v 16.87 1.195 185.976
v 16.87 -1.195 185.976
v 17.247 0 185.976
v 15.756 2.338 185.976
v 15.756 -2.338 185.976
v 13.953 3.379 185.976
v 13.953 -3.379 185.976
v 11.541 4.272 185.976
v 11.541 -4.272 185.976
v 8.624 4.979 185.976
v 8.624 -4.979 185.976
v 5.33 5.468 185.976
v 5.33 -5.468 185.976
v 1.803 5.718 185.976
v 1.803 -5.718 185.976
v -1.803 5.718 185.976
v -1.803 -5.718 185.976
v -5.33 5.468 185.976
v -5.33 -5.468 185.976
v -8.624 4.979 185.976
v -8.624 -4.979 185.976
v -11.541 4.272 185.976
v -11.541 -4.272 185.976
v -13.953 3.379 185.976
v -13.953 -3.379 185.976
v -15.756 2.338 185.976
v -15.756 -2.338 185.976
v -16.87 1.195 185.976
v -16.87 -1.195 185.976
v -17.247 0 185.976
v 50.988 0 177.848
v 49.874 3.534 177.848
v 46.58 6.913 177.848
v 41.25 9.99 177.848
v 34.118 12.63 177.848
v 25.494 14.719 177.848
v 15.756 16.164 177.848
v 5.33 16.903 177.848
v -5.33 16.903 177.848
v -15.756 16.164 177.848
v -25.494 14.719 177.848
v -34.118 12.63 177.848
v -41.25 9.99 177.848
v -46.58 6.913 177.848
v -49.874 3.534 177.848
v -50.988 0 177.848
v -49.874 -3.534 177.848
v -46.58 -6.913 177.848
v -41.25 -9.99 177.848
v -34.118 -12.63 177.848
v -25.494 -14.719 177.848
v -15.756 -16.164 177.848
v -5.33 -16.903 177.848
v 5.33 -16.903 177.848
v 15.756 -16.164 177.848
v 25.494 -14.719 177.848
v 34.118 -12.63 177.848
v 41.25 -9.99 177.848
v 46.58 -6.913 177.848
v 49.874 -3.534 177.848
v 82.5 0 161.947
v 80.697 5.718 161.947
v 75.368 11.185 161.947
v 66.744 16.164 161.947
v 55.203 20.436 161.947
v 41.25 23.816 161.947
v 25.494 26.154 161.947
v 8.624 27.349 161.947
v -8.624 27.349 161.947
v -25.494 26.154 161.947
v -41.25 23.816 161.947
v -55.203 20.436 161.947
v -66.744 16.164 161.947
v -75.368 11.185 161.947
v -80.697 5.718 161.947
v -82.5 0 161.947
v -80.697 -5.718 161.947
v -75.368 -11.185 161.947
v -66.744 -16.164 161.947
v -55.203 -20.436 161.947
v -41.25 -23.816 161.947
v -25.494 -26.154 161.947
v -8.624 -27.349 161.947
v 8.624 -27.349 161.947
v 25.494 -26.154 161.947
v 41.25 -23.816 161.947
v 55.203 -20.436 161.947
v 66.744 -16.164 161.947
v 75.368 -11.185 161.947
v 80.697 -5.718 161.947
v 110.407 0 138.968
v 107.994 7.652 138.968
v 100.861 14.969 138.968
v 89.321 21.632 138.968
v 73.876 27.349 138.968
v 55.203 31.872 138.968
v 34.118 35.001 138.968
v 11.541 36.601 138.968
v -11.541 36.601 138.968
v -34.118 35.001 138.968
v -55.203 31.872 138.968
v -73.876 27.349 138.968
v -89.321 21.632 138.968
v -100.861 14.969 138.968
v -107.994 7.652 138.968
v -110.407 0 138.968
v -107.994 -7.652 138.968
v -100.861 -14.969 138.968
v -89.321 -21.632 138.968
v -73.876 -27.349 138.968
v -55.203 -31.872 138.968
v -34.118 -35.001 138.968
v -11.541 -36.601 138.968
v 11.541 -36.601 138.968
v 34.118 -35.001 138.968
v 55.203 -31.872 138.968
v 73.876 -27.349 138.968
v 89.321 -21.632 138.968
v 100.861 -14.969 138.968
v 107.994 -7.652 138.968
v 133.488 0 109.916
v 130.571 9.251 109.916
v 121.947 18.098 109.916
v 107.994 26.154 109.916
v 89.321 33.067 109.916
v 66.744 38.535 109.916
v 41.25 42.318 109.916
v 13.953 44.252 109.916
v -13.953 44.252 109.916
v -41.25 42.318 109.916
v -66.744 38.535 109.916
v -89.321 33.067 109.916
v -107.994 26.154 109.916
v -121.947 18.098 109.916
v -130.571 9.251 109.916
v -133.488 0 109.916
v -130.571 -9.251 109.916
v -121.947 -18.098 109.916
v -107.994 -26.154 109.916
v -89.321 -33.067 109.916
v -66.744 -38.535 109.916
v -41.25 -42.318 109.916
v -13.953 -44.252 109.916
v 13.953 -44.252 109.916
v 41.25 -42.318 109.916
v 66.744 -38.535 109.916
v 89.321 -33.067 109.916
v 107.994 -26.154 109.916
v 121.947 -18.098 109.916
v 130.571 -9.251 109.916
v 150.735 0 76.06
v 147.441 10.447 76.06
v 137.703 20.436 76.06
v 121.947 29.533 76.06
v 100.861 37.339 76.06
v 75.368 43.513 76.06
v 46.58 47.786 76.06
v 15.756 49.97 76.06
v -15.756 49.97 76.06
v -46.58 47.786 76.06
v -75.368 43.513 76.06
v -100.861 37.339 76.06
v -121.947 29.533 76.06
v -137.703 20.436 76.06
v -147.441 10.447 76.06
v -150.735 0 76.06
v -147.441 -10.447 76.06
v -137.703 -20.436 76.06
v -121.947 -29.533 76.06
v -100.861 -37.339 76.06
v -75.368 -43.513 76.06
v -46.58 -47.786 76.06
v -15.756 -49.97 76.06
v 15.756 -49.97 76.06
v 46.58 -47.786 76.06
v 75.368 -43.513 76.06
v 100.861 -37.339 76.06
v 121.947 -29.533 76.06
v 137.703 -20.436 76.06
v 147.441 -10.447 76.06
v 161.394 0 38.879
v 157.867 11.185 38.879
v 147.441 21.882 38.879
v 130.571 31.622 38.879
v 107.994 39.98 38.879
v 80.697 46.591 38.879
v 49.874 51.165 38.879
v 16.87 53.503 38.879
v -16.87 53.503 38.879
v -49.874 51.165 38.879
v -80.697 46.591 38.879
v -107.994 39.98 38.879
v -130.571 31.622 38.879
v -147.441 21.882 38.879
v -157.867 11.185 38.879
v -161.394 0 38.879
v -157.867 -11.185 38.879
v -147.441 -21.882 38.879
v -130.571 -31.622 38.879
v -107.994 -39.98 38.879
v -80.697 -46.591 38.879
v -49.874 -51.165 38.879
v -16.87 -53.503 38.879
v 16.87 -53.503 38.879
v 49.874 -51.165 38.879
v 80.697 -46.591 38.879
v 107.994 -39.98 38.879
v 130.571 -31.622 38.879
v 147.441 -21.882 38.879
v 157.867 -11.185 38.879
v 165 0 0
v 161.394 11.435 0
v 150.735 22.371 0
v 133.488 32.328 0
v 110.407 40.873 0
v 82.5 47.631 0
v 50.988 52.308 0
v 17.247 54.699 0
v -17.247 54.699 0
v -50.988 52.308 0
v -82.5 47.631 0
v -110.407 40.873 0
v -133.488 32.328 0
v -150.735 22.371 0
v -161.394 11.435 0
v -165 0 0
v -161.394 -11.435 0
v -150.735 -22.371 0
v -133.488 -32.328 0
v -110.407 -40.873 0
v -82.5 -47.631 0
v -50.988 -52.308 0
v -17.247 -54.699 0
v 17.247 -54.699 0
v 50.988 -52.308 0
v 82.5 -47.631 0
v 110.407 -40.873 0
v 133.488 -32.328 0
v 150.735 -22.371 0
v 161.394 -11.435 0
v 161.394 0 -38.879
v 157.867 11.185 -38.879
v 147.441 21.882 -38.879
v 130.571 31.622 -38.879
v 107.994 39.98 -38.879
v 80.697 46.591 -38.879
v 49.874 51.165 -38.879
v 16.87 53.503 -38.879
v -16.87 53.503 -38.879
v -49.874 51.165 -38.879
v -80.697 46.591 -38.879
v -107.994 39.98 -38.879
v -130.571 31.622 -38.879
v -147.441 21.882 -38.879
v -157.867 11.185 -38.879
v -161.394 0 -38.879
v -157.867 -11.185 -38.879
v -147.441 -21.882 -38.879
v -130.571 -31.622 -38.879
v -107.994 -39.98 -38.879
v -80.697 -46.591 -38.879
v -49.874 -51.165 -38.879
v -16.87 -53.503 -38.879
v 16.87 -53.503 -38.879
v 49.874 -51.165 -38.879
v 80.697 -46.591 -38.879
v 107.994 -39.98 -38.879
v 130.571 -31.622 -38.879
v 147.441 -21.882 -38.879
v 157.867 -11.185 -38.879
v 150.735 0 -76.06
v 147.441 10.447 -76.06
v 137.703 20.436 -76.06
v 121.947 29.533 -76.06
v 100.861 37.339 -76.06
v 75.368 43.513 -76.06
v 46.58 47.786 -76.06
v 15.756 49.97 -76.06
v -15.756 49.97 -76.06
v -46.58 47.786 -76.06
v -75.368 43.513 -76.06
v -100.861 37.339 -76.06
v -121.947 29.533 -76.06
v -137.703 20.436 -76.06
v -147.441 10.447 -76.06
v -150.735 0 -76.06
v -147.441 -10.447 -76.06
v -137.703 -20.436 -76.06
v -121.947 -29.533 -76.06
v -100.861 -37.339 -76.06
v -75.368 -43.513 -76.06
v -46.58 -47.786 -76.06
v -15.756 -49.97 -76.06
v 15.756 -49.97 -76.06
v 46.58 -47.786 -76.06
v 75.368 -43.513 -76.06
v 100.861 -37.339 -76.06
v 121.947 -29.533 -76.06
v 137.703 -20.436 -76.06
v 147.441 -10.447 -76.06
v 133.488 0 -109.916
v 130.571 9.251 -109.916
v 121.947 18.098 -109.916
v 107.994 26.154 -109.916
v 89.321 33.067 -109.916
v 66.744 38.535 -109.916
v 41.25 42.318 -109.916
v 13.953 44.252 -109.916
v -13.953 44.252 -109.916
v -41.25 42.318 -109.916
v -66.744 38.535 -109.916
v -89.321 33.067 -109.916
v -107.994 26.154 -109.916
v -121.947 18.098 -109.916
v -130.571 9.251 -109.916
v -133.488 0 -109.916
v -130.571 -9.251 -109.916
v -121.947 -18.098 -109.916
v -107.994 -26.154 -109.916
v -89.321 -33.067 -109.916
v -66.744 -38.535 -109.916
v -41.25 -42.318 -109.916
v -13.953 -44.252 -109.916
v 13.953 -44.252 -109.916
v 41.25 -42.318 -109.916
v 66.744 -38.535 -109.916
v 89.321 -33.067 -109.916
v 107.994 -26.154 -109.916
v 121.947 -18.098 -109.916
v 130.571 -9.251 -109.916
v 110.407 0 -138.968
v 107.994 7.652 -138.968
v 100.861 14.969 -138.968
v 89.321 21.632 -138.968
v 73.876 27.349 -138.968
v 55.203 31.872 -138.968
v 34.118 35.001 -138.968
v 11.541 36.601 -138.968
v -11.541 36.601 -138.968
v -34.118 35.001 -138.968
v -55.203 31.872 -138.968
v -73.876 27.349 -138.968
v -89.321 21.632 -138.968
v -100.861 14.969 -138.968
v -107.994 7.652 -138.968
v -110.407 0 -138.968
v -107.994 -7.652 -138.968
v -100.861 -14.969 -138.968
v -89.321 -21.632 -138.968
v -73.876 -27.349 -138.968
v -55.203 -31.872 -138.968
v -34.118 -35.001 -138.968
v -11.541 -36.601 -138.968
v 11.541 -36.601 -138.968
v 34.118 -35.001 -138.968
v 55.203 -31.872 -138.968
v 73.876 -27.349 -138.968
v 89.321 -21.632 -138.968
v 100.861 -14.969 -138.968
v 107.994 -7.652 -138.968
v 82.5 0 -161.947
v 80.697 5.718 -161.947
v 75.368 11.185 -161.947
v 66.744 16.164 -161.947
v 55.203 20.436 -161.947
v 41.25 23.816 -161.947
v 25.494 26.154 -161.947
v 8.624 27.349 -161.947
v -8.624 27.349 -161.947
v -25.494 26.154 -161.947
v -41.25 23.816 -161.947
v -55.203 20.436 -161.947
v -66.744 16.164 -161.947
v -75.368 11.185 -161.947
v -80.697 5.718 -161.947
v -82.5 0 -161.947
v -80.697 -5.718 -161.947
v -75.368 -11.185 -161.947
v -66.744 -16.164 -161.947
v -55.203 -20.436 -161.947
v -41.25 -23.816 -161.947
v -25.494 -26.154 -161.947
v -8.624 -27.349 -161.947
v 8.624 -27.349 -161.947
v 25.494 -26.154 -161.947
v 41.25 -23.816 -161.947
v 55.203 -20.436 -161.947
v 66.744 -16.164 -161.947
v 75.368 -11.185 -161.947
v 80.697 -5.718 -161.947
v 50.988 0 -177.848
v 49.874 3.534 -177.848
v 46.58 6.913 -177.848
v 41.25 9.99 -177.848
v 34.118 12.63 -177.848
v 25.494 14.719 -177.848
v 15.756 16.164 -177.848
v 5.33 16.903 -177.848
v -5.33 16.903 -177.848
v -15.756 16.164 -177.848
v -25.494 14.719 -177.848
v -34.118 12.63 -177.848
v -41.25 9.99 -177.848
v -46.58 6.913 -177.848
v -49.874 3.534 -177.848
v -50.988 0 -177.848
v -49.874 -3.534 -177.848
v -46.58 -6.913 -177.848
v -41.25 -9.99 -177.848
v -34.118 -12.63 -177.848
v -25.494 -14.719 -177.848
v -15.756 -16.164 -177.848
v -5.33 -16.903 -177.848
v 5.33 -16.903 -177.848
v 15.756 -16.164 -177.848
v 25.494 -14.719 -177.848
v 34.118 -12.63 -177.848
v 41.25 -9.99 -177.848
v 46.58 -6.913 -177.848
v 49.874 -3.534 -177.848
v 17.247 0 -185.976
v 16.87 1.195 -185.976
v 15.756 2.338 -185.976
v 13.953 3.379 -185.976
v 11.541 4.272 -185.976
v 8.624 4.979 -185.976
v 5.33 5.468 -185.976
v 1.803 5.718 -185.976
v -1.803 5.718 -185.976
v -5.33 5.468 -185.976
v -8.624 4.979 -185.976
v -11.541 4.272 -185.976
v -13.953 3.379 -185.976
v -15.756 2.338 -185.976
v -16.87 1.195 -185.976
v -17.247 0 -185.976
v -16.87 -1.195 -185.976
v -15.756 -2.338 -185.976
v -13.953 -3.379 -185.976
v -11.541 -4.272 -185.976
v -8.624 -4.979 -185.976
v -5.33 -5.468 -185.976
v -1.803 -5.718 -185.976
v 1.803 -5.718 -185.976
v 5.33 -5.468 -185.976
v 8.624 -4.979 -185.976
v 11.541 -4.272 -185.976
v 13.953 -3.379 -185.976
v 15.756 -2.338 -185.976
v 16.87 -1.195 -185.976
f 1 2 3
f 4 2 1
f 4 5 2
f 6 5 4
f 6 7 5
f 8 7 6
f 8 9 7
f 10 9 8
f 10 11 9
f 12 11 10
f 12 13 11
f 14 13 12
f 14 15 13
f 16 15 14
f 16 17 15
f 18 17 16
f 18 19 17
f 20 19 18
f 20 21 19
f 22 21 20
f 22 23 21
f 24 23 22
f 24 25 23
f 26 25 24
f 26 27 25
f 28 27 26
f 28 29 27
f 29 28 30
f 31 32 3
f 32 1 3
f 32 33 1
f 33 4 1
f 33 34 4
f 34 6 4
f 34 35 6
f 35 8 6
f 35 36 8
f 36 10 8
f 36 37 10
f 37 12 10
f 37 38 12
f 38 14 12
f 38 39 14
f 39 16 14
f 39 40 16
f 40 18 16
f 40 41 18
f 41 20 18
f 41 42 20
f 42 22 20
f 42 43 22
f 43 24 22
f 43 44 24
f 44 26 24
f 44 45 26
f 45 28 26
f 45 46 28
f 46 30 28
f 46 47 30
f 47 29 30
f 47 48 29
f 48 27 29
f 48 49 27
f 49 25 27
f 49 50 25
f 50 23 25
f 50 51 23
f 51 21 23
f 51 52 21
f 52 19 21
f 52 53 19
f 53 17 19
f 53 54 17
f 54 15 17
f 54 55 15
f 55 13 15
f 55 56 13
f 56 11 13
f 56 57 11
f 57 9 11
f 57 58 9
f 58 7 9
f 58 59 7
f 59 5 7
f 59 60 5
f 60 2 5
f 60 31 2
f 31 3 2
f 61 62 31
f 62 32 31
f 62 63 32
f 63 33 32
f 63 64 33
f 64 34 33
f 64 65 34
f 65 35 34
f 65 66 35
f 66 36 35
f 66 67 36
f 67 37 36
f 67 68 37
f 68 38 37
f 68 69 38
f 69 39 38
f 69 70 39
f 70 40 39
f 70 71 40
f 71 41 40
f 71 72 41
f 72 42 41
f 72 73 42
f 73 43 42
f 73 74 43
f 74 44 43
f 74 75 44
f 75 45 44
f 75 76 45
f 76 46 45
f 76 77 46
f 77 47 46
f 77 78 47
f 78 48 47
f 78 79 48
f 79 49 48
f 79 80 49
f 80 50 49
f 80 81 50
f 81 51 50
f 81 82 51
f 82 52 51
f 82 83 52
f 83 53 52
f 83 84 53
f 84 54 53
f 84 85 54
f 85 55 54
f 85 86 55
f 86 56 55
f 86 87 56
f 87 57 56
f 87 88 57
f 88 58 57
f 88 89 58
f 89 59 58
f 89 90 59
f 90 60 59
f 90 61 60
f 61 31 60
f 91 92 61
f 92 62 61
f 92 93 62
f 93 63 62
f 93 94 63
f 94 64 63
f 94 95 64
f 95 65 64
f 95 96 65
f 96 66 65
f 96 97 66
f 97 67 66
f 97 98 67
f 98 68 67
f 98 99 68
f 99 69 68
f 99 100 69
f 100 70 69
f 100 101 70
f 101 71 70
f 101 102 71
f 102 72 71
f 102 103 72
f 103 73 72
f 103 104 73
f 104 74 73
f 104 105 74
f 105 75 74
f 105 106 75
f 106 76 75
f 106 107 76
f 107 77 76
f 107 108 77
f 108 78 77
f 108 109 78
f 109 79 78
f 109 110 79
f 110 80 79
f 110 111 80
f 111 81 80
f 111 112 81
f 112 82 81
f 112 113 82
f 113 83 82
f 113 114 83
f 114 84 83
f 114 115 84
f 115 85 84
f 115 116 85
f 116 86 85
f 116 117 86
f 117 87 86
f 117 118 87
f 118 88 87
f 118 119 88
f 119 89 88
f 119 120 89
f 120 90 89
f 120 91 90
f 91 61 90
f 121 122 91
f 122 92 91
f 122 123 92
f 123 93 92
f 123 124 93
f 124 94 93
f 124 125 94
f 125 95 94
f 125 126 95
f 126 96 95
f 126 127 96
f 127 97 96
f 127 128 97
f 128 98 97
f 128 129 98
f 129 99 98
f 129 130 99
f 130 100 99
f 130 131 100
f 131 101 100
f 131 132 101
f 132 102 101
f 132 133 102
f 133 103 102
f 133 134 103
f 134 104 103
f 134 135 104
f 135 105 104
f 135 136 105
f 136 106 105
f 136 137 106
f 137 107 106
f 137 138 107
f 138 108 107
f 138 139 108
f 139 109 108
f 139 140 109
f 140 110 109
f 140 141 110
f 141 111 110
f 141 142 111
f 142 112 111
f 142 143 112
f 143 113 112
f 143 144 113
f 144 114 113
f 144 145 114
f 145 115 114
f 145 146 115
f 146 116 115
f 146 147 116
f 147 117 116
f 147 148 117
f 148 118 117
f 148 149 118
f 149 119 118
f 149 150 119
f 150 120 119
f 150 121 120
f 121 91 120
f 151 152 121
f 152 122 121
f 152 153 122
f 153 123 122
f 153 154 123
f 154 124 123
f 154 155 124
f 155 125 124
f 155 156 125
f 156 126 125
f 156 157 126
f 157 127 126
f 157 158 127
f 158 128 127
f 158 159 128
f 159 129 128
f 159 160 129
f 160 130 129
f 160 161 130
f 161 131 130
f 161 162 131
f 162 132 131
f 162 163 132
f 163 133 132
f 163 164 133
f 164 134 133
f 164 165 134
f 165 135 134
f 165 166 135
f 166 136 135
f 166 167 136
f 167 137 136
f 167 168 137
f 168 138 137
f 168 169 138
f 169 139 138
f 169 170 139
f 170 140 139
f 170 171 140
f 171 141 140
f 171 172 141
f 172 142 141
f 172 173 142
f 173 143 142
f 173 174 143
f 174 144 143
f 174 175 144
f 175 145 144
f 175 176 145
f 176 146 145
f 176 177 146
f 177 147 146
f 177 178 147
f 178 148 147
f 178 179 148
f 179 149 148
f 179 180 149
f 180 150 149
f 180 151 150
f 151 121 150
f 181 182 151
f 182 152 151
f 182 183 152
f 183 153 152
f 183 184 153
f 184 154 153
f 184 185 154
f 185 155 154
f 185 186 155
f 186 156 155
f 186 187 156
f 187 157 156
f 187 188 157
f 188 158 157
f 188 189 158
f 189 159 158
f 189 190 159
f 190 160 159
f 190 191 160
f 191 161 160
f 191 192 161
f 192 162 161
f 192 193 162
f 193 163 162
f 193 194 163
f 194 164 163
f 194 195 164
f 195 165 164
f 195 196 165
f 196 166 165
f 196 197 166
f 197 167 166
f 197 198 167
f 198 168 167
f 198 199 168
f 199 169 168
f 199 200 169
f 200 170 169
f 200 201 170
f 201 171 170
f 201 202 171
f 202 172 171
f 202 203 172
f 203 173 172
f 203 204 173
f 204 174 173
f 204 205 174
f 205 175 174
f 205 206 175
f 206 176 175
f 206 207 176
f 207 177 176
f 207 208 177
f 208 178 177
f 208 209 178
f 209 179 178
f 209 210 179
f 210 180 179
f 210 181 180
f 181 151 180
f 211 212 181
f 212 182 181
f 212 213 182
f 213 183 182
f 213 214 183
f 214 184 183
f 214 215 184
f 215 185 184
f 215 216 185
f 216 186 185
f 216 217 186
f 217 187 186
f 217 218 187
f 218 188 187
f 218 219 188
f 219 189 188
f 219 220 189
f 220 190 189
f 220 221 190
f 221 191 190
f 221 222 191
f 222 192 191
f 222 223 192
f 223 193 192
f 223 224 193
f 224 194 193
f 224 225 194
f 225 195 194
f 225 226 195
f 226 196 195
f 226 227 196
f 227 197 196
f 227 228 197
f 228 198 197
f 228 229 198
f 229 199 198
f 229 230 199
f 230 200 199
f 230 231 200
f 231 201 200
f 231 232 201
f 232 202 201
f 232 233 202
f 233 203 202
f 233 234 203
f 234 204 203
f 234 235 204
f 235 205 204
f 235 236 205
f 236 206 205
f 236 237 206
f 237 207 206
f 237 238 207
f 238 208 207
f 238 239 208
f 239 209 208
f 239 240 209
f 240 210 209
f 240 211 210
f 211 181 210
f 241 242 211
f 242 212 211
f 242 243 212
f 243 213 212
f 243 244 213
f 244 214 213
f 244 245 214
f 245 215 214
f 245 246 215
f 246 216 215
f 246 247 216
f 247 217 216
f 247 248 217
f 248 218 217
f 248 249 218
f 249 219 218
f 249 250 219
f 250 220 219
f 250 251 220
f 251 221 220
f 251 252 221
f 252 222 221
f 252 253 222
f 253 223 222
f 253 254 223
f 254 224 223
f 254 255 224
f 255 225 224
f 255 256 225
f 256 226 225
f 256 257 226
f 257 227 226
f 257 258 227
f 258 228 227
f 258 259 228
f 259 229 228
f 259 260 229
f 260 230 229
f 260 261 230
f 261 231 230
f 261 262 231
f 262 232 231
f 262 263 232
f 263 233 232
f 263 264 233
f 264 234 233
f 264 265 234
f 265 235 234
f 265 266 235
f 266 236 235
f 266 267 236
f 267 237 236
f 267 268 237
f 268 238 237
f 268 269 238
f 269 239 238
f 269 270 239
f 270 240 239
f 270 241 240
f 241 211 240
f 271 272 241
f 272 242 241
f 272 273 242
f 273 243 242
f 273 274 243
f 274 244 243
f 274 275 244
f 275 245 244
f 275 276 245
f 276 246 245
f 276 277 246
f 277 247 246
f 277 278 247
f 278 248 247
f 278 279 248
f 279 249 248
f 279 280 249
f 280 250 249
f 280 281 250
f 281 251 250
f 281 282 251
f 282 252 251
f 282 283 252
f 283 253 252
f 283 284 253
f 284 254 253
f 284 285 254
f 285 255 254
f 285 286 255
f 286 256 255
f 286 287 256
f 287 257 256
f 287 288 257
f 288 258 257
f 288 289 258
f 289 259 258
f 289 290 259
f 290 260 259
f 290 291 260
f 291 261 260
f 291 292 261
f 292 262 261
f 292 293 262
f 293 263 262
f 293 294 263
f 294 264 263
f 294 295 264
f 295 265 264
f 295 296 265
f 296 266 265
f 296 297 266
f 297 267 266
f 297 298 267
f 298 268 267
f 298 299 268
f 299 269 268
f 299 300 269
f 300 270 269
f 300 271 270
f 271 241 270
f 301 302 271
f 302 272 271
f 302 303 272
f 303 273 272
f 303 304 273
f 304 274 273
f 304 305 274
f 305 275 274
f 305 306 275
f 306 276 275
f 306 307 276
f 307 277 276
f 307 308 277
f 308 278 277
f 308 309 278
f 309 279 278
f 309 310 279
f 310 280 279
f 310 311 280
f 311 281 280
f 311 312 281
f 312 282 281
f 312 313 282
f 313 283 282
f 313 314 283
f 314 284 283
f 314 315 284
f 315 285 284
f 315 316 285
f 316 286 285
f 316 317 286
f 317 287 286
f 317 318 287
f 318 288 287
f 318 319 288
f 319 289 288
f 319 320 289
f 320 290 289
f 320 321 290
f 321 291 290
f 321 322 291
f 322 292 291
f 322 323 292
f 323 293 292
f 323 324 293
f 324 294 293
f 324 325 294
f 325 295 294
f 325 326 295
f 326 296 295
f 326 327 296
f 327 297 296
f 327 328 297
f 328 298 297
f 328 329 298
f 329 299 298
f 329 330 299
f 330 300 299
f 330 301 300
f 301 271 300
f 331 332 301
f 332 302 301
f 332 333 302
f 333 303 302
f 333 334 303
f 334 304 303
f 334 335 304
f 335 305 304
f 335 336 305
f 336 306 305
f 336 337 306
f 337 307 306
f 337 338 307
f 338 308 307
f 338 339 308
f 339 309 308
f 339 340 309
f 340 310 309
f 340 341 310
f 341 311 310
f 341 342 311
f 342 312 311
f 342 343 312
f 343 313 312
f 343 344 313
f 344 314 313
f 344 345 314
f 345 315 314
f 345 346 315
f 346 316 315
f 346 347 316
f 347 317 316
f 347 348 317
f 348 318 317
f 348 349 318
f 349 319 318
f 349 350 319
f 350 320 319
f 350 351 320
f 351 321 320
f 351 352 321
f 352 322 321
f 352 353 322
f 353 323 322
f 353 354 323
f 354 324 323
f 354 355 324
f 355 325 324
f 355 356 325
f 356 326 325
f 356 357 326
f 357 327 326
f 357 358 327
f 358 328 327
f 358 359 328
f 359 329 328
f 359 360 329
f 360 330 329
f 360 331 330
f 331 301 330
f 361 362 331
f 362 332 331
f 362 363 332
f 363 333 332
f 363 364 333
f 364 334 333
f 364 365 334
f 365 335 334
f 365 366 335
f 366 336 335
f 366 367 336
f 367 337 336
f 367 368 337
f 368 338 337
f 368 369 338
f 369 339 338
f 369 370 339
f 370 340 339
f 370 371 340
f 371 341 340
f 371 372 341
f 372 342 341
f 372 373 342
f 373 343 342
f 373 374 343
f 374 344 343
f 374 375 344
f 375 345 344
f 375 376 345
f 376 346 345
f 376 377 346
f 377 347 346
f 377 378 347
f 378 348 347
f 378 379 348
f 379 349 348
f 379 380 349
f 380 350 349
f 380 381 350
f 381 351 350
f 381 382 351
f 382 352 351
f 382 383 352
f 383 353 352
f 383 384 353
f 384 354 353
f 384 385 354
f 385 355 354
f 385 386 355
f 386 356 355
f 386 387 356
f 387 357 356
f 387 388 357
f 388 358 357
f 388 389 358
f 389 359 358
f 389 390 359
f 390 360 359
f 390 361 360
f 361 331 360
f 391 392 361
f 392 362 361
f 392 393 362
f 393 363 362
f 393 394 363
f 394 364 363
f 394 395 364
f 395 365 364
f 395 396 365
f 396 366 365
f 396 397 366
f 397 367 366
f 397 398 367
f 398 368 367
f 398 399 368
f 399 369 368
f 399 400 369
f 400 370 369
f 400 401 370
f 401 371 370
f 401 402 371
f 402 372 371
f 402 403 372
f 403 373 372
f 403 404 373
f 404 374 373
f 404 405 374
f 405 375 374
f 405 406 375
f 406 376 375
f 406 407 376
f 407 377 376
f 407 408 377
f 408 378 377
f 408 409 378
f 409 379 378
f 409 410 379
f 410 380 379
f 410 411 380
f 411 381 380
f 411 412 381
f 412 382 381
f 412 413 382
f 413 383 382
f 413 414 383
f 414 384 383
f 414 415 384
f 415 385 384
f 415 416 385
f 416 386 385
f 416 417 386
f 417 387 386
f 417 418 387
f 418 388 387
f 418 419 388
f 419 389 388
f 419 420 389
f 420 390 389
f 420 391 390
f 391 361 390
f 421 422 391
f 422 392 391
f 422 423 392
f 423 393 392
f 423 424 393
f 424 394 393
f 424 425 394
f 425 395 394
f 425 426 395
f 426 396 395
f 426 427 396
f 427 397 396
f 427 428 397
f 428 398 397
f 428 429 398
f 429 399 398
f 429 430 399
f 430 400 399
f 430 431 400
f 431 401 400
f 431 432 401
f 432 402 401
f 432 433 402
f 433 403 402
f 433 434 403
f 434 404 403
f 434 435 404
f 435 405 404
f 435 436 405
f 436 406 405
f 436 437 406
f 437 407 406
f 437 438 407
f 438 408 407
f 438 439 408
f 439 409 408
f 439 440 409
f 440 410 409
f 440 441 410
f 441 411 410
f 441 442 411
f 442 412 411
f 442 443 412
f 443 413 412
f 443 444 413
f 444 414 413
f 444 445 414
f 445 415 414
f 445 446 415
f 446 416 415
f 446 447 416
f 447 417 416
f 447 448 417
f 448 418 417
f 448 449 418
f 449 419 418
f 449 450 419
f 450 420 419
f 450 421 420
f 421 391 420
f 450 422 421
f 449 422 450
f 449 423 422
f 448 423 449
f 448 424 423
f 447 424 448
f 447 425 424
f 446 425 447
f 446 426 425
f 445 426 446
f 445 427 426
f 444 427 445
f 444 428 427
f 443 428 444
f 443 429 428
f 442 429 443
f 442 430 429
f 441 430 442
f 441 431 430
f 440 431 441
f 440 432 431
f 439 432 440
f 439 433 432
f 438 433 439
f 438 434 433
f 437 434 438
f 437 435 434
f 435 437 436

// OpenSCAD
// Generated by SolidPython 1.0.1 on 2020-07-29 00:46:51


scale(v = [15, 5, 17]) {
	sphere(r = 11);
}
/***********************************************
*********      SolidPython code:      **********
************************************************
 
# import packages: SolidPython
from solid import *
from solid.utils import *
from itertools import chain, combinations, permutations


class Resize:

    def __init__(self, scad_file):
        self.scad_file = scad_file
        #self.scad_file = import_scad(scad_file)
        # cone/cylinder param:
        self.r1 = 0
        self.r2 = 0
        self.h = 0
        # rectangular prism param:
        self.w = 0
        self.l = 0
        # ellipse param:
        self.r = 0

    # import OpenScad code (file name corresponds to shape)


    # classify shape + parameters
    def assign(self, param1, param2, param3):
        if self.scad_file == 'cone.scad':
            self.r1 = param1
            self.r2 = param2
            self.h = param3
        elif self.scad_file == 'cylinder.scad':
            self.r1 = param1
            self.r2 = param2
            self.h = param3
        elif self.scad_file == 'rectangularPrism.scad':
            self.h = param1
            self.l = param2
            self.w = param3
        else:
            self.r = param1
            self.h = param2

    # resize parameters
    def iterate(self):
        x = range(3, 20, 2)
        i = 1
        if self.scad_file == 'cone.scad':
            tempList = list(permutations(x, 2))
            for temp in tempList:
                param1 = temp[0]
                param2 = temp[1]
                filepath = 'produced_scad_files/' + 'cone' + str(param1) + '_' + str(param2) + '_' + '.scad'
                scad_render_to_file(cylinder(h=param1, r1=param2, r2=0), filepath)

        elif self.scad_file == 'cylinder.scad':
            tempList = list(permutations(x, 3))
            for temp in tempList:
                param1 = temp[0]
                param2 = temp[1]
                filepath = 'produced_scad_files/' + 'cylinder' + str(param1) + '_' + str(param2) + '_' + '.scad'
                scad_render_to_file(cylinder(h=param1, r1=param2, r2=param2), filepath)

        elif self.scad_file == 'rectangularPrism.scad':
            tempList = list(permutations(x, 3))
            for temp in tempList:
                param1 = temp[0]
                param2 = temp[1]
                param3 = temp[2]
                filepath = 'produced_scad_files/' + 'rectangularPrism' + str(param1) + '_' + str(param2) + '_' + str(
                    param3) + '.scad'
                scad_render_to_file(cube(size=(param1, param2, param3)), filepath)

        elif self.scad_file == 'ellipse.scad':
            tempList = list(permutations(x, 4))
            for temp in tempList:
                param1 = temp[0]
                param2 = temp[1]
                param3 = temp[2]
                param4 = temp[3]
                filepath = 'produced_scad_files/' + 'ellipse' + str(param1) + '_' + str(param2) + '_' + str(param3) + '_' + str(param4) + '.scad'
                scad_render_to_file(scale([param1, param2, param3])(sphere(r=param4)), filepath)

    def render_to_scadfile(self):
        scad_render_to_file(scad, 'example.scad') 
 
************************************************/
